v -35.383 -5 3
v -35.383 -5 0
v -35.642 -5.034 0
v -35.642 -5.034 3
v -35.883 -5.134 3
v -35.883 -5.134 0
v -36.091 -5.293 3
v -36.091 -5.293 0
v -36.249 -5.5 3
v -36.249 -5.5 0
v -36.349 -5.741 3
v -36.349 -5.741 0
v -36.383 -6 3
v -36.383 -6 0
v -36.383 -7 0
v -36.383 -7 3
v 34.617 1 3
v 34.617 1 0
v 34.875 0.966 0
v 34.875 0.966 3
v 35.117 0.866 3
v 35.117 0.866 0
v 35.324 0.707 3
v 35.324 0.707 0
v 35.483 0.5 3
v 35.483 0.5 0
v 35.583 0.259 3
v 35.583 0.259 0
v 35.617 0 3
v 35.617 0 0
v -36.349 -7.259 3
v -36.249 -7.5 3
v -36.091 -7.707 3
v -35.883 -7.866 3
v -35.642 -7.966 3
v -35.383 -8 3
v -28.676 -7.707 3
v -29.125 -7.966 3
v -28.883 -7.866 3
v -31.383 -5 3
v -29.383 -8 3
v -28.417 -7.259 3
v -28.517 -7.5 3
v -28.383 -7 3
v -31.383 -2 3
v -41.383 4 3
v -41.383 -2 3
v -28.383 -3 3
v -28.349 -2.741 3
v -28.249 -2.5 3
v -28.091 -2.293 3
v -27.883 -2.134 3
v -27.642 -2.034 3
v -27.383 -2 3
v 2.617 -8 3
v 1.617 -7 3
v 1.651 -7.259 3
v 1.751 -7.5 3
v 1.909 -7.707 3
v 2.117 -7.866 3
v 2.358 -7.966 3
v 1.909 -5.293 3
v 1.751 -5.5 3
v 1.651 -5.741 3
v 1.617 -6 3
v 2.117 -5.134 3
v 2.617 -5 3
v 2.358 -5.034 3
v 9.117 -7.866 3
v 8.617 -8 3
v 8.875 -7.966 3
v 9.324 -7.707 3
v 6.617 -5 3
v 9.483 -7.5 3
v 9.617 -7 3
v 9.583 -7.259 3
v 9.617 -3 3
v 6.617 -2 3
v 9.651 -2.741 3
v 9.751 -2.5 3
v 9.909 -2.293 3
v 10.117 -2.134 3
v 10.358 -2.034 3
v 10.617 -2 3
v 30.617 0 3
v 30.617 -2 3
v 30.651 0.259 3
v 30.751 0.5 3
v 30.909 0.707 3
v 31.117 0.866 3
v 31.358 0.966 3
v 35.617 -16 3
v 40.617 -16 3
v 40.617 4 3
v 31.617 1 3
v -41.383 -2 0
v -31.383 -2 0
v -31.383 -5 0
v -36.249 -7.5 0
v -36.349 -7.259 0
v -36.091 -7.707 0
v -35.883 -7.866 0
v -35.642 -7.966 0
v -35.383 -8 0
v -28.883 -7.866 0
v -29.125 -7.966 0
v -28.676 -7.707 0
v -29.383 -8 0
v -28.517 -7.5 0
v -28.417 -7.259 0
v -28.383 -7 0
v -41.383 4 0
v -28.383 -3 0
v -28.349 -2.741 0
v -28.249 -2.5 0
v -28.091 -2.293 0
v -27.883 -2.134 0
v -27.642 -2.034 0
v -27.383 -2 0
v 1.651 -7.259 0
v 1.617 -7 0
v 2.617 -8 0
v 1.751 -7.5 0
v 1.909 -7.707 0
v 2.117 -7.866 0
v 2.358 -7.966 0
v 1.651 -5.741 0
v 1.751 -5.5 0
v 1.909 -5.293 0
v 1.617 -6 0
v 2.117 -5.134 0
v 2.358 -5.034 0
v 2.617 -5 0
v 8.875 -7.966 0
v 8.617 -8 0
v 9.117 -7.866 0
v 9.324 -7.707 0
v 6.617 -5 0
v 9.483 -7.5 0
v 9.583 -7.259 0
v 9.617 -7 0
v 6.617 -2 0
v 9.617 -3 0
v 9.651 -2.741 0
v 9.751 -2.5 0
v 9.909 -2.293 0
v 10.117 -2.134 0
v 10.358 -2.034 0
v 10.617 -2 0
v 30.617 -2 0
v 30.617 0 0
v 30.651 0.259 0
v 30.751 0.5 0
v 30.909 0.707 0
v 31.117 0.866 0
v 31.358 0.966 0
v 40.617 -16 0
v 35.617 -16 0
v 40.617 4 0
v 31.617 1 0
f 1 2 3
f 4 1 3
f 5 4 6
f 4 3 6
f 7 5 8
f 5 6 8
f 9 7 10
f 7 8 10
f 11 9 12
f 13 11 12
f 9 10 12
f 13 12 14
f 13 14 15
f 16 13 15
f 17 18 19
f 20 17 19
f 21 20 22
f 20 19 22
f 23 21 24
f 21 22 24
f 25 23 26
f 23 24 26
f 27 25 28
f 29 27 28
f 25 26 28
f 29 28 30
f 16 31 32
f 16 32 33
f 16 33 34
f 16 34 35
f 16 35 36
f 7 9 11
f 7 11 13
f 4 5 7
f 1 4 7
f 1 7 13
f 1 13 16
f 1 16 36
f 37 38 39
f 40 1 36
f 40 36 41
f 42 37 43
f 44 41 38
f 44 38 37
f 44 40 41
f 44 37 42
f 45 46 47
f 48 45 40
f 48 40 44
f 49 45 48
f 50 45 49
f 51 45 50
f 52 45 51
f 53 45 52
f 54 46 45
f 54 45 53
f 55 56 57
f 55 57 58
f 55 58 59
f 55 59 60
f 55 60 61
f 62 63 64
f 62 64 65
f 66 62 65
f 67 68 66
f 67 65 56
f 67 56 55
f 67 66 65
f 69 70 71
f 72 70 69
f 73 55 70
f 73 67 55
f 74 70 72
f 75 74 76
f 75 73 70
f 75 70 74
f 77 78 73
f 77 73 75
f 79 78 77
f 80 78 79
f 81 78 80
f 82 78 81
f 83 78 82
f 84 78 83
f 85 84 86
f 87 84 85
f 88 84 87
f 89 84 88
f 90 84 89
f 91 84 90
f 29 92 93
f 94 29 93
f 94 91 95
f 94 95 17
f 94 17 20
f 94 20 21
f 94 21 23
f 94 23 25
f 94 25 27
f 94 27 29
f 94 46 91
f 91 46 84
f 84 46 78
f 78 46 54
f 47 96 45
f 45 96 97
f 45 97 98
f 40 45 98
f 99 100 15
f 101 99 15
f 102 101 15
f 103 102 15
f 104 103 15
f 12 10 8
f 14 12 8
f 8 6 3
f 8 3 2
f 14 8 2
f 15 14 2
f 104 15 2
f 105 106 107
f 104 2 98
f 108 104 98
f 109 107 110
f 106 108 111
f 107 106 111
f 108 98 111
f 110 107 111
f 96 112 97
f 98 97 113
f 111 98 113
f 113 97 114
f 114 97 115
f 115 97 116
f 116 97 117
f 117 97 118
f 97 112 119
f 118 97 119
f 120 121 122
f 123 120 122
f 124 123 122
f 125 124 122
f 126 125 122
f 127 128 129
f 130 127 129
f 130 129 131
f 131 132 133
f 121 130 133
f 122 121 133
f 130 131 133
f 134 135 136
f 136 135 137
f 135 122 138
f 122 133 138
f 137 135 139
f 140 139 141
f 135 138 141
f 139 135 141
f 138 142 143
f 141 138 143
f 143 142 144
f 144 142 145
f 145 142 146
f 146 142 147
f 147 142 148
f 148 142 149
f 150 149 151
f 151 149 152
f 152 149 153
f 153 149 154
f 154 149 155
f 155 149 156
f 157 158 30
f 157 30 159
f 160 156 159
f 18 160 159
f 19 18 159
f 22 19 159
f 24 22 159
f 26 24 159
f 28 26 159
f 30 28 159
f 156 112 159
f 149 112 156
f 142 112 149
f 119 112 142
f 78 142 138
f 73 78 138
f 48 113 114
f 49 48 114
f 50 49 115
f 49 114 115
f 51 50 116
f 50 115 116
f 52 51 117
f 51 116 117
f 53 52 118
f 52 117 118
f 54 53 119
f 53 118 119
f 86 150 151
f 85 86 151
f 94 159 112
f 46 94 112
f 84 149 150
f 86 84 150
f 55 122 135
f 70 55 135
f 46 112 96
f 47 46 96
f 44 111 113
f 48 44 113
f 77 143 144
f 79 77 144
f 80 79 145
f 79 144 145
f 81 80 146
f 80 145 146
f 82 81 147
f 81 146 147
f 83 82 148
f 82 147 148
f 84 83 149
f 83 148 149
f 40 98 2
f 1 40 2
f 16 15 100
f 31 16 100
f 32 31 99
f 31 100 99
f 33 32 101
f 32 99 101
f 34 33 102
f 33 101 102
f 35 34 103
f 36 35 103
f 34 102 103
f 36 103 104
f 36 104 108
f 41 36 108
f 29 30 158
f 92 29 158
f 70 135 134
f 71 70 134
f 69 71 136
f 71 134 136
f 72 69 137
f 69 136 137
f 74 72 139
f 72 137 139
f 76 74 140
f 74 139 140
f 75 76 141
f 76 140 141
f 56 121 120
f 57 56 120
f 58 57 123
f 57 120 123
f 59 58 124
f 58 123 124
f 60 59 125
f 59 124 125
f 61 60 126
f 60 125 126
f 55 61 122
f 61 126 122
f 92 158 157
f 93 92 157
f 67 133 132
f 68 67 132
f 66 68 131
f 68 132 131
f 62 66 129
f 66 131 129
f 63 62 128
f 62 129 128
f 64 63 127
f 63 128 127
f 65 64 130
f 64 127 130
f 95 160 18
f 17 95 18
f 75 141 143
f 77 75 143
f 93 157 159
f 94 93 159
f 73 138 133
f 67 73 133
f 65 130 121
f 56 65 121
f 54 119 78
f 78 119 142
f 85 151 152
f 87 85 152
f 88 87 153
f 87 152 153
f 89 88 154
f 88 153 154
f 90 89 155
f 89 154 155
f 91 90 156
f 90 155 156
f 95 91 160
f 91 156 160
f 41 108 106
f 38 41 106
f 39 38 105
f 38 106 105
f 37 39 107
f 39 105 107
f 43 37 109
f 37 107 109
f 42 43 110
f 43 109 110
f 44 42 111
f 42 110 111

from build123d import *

# Parameters (mm, degrees)
BOSS_EXTRUDE1_DEPTH = 3


with BuildPart() as part:
    # Sketch3 → Boss-Extrude1 (new body)
    with BuildSketch(Plane.XY):
        with BuildLine():
            Line((29.616597331, 4), (-41.383402669, 4))
            Line((-41.383402669, 4), (-41.383402669, 1))
            Line((-41.383402669, 1), (-41.383402669, -2))
            Line((-41.383402669, -2), (-31.383402669, -2))
            Line((-31.383402669, -2), (-31.383402669, -5))
            Line((-31.383402669, -5), (-35.383402669, -5))
            ThreePointArc((-35.383402669, -5), (-36.09050945, -5.292893219), (-36.383402669, -6))
            Line((-36.383402669, -6), (-36.383402669, -7))
            ThreePointArc((-36.383402669, -7), (-36.09050945, -7.707106781), (-35.383402669, -8))
            Line((-35.383402669, -8), (-29.383402669, -8))
            ThreePointArc((-29.383402669, -8), (-28.676295888, -7.707106781), (-28.383402669, -7))
            Line((-28.383402669, -7), (-28.383402669, -3))
            ThreePointArc((-28.383402669, -3), (-28.09050945, -2.292893219), (-27.383402669, -2))
            Line((-27.383402669, -2), (6.616597331, -2))
            Line((6.616597331, -2), (6.616597331, -5))
            Line((6.616597331, -5), (2.616597331, -5))
            ThreePointArc((2.616597331, -5), (1.90949055, -5.292893219), (1.616597331, -6))
            Line((1.616597331, -6), (1.616597331, -7))
            ThreePointArc((1.616597331, -7), (1.90949055, -7.707106781), (2.616597331, -8))
            Line((2.616597331, -8), (8.616597331, -8))
            ThreePointArc((8.616597331, -8), (9.323704112, -7.707106781), (9.616597331, -7))
            Line((9.616597331, -7), (9.616597331, -3))
            ThreePointArc((9.616597331, -3), (9.90949055, -2.292893219), (10.616597331, -2))
            Line((10.616597331, -2), (30.616597331, -2))
            Line((30.616597331, -2), (30.616597331, 0))
            ThreePointArc((30.616597331, 0), (30.90949055, 0.707106781), (31.616597331, 1))
            Line((31.616597331, 1), (34.616597331, 1))
            ThreePointArc((34.616597331, 1), (35.323704112, 0.707106781), (35.616597331, 0))
            Line((35.616597331, 0), (35.616597331, -16))
            Line((35.616597331, -16), (40.616597331, -16))
            Line((40.616597331, -16), (40.616597331, 4))
            Line((40.616597331, 4), (35.616597331, 4))
            Line((35.616597331, 4), (29.616597331, 4))
        make_face()
    extrude(amount=BOSS_EXTRUDE1_DEPTH)


solid = part.part
